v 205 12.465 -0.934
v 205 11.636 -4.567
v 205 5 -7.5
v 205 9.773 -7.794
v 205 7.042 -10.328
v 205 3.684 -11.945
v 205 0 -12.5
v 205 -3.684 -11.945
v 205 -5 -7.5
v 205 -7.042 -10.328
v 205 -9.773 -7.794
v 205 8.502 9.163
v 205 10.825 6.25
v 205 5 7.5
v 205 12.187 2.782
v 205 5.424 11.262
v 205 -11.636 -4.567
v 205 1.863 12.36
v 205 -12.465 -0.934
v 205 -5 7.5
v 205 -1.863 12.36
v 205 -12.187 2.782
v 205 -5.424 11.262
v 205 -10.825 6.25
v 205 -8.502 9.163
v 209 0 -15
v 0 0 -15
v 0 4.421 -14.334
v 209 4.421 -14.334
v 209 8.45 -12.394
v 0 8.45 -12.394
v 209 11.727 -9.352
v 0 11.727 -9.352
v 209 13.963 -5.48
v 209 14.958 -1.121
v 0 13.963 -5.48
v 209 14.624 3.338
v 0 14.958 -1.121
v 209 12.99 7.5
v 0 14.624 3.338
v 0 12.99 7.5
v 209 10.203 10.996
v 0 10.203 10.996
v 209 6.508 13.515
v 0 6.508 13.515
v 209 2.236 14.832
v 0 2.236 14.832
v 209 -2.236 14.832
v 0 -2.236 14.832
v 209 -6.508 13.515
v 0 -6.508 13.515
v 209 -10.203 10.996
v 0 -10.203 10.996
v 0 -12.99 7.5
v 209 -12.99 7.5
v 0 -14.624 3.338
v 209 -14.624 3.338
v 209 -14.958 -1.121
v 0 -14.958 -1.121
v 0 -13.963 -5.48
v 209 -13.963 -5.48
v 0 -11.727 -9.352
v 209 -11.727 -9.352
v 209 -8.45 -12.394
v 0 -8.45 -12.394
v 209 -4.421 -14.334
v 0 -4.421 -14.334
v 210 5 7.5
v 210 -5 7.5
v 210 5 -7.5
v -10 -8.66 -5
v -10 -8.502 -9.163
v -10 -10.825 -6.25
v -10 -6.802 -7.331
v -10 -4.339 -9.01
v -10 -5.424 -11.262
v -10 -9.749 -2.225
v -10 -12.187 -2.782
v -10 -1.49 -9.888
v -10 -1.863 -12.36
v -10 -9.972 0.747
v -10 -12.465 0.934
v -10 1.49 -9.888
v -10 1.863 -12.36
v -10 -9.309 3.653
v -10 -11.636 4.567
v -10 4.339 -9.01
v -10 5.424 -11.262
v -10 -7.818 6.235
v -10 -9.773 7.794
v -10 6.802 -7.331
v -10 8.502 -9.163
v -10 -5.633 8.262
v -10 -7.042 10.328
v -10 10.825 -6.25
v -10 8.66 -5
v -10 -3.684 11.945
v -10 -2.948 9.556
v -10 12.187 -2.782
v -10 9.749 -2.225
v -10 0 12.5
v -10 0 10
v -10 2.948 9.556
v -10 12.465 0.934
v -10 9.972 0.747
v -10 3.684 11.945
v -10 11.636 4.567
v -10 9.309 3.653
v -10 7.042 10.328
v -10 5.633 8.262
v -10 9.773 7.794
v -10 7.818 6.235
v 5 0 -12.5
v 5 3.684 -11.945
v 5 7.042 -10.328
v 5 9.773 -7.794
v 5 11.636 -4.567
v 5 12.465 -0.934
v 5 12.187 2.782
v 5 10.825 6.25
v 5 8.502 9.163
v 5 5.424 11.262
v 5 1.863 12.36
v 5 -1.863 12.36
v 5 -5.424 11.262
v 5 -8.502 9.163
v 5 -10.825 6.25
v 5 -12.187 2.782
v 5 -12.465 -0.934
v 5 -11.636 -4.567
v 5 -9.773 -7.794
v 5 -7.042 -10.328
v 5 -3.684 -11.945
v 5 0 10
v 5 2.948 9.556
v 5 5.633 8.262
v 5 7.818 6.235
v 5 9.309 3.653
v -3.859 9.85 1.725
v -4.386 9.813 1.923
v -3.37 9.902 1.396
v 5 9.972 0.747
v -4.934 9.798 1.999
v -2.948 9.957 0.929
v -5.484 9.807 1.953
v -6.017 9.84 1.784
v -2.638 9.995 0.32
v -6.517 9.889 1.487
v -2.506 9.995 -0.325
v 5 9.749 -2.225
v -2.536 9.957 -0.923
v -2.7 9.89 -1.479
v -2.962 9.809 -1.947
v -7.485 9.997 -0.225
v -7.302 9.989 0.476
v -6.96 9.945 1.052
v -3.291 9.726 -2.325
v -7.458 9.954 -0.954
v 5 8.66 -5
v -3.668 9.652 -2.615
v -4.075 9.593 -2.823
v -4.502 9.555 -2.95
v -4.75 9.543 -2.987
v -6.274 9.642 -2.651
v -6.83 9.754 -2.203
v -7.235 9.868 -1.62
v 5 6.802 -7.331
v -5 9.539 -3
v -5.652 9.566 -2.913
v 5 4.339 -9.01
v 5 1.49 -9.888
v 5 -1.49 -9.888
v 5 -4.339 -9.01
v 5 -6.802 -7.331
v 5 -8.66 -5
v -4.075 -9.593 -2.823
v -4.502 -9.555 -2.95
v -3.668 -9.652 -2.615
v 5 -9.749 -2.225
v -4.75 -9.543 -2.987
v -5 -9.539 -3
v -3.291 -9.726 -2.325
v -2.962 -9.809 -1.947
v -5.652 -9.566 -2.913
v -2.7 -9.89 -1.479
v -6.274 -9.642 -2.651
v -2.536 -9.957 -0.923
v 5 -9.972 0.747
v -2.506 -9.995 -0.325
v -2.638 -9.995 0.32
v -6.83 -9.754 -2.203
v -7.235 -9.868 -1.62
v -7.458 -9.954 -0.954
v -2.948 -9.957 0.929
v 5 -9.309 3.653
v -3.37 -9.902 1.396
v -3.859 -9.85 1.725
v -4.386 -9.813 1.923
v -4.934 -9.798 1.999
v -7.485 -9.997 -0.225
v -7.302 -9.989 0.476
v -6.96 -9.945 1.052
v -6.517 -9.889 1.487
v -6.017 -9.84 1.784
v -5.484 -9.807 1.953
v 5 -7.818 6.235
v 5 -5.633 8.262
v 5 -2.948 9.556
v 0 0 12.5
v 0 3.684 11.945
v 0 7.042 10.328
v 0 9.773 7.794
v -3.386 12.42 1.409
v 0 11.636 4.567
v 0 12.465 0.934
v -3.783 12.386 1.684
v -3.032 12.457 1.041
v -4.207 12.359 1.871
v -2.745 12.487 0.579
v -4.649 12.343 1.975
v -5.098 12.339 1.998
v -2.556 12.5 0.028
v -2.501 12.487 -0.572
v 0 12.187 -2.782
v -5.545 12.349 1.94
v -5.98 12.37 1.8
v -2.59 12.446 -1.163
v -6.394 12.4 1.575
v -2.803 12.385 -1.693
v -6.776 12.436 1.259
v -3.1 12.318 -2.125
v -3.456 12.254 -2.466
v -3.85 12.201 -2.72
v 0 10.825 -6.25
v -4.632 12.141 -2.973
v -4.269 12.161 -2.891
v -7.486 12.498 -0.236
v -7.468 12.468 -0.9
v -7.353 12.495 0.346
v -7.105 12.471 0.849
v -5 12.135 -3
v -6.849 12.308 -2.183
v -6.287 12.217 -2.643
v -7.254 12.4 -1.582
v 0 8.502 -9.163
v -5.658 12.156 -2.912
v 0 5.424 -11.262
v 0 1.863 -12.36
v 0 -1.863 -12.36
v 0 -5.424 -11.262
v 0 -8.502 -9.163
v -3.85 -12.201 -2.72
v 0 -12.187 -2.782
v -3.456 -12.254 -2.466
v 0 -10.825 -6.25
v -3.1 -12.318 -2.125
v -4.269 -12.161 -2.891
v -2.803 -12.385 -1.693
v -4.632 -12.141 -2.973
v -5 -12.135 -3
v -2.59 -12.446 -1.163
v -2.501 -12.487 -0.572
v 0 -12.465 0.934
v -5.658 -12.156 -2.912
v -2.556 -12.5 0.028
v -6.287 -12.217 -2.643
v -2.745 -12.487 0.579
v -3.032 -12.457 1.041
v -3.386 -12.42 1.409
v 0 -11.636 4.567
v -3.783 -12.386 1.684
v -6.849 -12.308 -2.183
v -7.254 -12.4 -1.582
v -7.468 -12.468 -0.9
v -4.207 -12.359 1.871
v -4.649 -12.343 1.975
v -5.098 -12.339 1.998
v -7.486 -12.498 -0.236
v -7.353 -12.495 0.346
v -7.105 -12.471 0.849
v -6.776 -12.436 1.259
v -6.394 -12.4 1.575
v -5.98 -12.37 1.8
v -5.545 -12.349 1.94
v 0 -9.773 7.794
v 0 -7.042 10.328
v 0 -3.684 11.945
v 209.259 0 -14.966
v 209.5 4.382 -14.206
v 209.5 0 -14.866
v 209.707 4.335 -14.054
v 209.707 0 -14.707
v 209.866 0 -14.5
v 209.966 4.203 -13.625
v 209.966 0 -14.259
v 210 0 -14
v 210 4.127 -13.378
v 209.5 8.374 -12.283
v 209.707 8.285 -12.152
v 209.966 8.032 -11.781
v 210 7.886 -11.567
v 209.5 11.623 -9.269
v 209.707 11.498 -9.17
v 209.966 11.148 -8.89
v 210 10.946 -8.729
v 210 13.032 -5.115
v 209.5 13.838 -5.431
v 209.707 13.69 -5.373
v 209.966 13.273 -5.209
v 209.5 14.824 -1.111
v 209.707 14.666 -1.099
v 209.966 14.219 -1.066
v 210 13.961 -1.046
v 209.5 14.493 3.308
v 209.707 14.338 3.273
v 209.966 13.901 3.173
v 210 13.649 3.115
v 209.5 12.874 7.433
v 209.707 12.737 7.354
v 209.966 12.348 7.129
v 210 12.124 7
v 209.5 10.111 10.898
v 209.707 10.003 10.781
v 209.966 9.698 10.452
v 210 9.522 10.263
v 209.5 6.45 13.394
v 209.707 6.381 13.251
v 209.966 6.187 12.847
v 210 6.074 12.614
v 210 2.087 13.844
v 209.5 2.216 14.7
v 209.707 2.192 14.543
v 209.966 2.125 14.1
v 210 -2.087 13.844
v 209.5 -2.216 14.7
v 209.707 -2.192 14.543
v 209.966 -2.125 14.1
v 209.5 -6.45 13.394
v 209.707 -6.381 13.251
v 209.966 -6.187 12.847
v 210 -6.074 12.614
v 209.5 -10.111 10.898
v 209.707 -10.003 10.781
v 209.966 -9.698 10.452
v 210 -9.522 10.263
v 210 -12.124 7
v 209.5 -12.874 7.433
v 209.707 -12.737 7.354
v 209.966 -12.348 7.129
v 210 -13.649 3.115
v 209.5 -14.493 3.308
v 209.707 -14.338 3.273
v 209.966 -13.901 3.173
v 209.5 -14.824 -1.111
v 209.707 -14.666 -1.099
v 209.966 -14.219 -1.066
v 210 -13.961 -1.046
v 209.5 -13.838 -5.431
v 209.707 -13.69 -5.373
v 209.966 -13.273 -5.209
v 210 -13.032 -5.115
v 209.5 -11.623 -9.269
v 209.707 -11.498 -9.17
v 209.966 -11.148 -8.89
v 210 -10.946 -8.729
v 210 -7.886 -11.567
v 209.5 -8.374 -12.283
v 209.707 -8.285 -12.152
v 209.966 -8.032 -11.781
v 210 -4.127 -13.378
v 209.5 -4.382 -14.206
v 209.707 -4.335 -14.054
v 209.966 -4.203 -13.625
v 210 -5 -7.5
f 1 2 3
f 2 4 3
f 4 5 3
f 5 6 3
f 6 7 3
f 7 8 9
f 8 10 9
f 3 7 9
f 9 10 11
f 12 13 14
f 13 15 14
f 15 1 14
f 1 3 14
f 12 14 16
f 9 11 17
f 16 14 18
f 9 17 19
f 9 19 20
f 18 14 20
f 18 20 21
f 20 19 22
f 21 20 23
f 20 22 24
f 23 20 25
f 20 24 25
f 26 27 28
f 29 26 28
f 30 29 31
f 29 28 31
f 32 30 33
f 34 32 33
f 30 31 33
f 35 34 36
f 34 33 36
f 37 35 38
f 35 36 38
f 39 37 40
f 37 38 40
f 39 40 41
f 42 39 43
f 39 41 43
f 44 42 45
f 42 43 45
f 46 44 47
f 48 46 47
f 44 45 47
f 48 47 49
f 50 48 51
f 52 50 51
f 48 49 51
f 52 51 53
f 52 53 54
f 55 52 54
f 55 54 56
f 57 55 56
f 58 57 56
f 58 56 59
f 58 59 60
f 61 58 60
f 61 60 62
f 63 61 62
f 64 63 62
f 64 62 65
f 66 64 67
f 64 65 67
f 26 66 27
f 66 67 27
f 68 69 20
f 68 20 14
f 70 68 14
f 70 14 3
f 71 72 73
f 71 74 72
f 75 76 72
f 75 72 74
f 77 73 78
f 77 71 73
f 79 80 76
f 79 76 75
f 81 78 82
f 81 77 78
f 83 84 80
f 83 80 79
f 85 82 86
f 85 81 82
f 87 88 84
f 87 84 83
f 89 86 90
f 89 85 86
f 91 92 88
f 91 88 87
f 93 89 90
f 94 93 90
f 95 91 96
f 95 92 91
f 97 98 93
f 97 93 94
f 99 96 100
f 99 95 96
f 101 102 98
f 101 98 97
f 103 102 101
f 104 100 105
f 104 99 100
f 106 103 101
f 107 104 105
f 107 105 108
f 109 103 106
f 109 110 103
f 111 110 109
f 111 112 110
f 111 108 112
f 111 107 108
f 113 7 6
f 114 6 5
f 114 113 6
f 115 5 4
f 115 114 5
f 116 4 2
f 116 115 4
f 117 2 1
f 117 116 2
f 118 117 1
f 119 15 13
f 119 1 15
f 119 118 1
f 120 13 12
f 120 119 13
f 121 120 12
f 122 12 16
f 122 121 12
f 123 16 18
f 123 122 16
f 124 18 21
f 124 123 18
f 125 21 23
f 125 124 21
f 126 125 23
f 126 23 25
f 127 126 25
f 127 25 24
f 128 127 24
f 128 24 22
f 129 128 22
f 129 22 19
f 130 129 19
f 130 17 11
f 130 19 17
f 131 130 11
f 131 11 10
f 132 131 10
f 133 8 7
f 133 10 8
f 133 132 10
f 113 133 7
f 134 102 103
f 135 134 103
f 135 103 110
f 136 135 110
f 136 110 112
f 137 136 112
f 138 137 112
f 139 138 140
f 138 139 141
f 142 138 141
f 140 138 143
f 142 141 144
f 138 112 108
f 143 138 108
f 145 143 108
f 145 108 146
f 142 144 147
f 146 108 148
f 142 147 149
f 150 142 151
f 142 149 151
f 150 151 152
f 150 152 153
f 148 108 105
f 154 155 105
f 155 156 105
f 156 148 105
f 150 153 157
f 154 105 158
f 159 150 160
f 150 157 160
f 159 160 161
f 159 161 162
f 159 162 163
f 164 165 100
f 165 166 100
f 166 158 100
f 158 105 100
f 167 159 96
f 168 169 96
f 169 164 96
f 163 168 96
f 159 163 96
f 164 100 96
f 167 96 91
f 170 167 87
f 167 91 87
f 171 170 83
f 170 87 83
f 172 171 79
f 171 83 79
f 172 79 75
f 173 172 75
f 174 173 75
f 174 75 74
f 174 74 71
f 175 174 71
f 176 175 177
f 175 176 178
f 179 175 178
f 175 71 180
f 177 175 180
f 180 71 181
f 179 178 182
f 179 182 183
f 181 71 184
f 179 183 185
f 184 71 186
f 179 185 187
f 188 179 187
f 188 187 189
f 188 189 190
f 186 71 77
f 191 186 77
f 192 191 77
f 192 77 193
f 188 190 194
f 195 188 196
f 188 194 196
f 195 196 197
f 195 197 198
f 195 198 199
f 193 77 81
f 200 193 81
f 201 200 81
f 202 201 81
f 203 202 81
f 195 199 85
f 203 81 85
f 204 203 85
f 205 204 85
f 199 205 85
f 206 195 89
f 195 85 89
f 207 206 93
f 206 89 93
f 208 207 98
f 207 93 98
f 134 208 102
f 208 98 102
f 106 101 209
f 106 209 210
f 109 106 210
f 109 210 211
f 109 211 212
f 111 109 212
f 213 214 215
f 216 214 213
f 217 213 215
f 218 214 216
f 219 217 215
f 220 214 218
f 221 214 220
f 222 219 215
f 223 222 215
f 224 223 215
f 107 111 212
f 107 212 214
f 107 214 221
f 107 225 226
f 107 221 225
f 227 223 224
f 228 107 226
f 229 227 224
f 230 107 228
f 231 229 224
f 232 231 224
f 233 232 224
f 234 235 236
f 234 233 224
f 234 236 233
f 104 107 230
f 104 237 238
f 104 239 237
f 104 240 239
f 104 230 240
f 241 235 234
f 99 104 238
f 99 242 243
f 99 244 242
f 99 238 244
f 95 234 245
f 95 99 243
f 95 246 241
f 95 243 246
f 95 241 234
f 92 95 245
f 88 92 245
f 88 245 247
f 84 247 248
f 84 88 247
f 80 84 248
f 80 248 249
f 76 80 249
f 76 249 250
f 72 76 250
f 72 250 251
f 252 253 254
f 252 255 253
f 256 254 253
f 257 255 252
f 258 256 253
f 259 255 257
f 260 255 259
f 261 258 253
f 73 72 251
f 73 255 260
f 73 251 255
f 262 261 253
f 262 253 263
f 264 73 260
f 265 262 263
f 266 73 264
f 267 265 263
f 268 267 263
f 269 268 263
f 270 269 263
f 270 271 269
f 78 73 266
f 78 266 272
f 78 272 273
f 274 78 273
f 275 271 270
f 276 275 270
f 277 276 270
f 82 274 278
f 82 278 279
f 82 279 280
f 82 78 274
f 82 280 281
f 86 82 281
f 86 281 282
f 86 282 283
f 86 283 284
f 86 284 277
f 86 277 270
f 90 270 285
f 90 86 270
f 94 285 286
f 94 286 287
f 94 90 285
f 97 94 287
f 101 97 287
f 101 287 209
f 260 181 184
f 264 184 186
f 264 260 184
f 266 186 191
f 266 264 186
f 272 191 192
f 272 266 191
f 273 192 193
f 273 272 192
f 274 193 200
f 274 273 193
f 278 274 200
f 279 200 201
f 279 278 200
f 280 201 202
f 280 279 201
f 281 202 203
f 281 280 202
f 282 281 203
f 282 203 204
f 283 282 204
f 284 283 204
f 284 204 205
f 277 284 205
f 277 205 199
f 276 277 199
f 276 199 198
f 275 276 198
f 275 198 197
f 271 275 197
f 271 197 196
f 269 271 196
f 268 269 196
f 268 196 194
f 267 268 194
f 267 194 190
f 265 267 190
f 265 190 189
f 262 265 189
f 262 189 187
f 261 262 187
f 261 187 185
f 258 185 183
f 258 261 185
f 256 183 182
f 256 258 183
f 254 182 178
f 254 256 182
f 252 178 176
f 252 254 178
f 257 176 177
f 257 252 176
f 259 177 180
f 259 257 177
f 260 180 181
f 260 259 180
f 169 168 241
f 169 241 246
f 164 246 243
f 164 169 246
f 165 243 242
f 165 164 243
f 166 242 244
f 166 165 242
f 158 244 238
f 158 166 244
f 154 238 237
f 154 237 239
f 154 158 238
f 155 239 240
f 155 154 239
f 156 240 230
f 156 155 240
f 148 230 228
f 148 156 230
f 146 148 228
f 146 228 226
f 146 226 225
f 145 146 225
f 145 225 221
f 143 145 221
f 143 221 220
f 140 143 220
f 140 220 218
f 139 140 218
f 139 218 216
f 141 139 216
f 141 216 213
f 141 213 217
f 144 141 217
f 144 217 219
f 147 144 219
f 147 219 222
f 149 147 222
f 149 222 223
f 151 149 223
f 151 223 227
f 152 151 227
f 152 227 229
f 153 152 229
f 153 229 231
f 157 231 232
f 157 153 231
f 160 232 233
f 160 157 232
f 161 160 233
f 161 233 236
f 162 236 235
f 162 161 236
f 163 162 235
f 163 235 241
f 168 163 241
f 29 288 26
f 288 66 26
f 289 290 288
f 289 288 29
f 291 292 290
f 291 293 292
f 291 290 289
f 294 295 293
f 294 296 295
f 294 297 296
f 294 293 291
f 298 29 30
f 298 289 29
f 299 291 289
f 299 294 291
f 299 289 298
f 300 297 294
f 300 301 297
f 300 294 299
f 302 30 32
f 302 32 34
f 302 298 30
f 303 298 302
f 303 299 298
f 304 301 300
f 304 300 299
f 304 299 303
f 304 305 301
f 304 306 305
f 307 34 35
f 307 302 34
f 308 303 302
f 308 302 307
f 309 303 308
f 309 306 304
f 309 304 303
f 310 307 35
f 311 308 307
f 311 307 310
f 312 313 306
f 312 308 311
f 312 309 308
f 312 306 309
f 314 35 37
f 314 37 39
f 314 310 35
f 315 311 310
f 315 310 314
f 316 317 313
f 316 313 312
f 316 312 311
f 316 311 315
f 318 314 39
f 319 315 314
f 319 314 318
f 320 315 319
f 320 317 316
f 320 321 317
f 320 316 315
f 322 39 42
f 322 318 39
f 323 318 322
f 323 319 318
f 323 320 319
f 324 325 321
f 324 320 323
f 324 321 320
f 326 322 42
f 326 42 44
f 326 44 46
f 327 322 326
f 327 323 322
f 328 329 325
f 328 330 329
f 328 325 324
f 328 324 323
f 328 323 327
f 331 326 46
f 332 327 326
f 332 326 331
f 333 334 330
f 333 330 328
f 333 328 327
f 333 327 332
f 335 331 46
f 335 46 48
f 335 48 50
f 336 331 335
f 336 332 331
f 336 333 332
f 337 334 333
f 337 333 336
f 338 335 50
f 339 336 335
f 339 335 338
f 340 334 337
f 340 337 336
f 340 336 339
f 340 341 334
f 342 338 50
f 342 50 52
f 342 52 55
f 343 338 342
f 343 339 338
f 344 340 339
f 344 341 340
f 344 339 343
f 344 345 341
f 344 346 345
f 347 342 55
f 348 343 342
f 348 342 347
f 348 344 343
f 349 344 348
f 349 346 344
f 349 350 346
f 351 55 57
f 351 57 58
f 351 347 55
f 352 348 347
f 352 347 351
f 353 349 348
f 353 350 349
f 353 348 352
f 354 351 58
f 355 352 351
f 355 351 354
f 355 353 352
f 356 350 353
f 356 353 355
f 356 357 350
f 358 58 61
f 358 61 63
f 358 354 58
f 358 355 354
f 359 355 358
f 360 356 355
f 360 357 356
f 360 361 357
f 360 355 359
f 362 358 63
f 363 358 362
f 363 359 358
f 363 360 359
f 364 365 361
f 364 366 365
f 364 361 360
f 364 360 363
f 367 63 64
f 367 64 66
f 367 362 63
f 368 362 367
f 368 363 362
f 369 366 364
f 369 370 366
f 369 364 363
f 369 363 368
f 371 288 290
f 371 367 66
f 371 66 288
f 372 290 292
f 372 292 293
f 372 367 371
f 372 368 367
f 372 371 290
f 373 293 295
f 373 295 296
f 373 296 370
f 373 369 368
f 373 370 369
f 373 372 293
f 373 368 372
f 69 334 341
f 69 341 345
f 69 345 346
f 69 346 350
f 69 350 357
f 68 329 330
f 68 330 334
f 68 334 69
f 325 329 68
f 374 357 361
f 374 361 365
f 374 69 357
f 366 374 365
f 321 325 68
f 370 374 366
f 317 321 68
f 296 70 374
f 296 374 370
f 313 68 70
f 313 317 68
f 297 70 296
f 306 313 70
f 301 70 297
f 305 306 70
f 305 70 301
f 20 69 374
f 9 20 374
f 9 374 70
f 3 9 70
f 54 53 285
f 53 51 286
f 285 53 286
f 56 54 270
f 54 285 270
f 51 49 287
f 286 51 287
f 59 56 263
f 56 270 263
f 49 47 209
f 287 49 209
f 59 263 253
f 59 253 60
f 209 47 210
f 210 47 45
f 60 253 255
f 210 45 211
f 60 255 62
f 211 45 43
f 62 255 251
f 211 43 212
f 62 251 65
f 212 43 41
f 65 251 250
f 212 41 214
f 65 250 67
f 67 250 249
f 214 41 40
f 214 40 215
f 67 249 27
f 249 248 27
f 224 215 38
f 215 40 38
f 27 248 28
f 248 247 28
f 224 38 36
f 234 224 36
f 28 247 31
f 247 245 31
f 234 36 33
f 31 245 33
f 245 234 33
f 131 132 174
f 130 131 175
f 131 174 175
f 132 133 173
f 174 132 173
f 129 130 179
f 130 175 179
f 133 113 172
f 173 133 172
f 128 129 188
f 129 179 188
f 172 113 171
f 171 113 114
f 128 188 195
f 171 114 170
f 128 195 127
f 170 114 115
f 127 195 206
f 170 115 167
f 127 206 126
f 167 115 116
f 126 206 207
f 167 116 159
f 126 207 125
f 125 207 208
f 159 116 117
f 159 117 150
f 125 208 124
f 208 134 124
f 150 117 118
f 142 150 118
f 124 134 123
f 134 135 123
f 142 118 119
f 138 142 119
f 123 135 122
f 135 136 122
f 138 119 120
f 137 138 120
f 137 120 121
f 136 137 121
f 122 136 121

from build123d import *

# Parameters (mm, degrees)
ESBO_O1_R                  = 15
ESBO_O1_R_2                = 12.5
RESSALTO_EXTRUS_O1_DEPTH   = 210
RESSALTO_EXTRUS_O3_START   = 10
ESBO_O2_R                  = 12.5
ESBO_O2_R_2                = 10
RESSALTO_EXTRUS_O3_DEPTH   = 15
CORTE_EXTRUS_O3_DEPTH      = 300
CORTE_EXTRUS_O3_DEPTH_BACK = 300
ESBO_O4_R                  = 2.5
RESSALTO_EXTRUS_O4_START   = -5
ESBO_O9_R                  = 12.5
RESSALTO_EXTRUS_O4_DEPTH   = 5
FILETE1_R                  = 1
ESBO_O11_W                 = 15
ESBO_O11_H                 = 10
CORTE_EXTRUS_O4_DEPTH      = 10


with BuildPart() as part:
    # Esboço1 → Ressalto-extrusão1 (new body)
    with BuildSketch(Plane(origin=(0, 0, 0), x_dir=(0, 0, -1), z_dir=(1, 0, 0))):
        Circle(ESBO_O1_R)
        Circle(ESBO_O1_R_2, mode=Mode.SUBTRACT)
    extrude(amount=RESSALTO_EXTRUS_O1_DEPTH)

    # Esboço2 → Ressalto-extrusão3 (add)
    with BuildSketch(Plane.ZY.offset(RESSALTO_EXTRUS_O3_START)):
        Circle(ESBO_O2_R)
        Circle(ESBO_O2_R_2, mode=Mode.SUBTRACT)
    extrude(amount=-RESSALTO_EXTRUS_O3_DEPTH)

    # Esboço4 → Corte-extrusão3 (cut, two sides: drawn at the far end of the back side and taken through both)
    with BuildSketch(Plane(origin=(0, 0, 0), x_dir=(1, 0, 0), z_dir=(0, 1, 0)).offset(-CORTE_EXTRUS_O3_DEPTH_BACK)):
        with Locations((-5, 0.5)):
            Circle(ESBO_O4_R)
    extrude(amount=CORTE_EXTRUS_O3_DEPTH + CORTE_EXTRUS_O3_DEPTH_BACK, mode=Mode.SUBTRACT)

    # Esboço9 → Ressalto-extrusão4 (add)
    with BuildSketch(Plane(origin=(210, 0, 0), x_dir=(0, 0, -1), z_dir=(1, 0, 0)).offset(RESSALTO_EXTRUS_O4_START)):
        Circle(ESBO_O9_R)
    extrude(amount=RESSALTO_EXTRUS_O4_DEPTH)

    # Filete1
    filete1_edges = [part.edges().sort_by_distance(p)[0] for p in [
        (210, 0, 15),
    ]]
    fillet(filete1_edges, radius=FILETE1_R)

    # Esboço11 → Corte-extrusão4 (cut)
    with BuildSketch(Plane(origin=(210, 0, 0), x_dir=(0, 0, -1), z_dir=(1, 0, 0))):
        Rectangle(ESBO_O11_W, ESBO_O11_H)
    extrude(amount=-CORTE_EXTRUS_O4_DEPTH, mode=Mode.SUBTRACT)


solid = part.part
